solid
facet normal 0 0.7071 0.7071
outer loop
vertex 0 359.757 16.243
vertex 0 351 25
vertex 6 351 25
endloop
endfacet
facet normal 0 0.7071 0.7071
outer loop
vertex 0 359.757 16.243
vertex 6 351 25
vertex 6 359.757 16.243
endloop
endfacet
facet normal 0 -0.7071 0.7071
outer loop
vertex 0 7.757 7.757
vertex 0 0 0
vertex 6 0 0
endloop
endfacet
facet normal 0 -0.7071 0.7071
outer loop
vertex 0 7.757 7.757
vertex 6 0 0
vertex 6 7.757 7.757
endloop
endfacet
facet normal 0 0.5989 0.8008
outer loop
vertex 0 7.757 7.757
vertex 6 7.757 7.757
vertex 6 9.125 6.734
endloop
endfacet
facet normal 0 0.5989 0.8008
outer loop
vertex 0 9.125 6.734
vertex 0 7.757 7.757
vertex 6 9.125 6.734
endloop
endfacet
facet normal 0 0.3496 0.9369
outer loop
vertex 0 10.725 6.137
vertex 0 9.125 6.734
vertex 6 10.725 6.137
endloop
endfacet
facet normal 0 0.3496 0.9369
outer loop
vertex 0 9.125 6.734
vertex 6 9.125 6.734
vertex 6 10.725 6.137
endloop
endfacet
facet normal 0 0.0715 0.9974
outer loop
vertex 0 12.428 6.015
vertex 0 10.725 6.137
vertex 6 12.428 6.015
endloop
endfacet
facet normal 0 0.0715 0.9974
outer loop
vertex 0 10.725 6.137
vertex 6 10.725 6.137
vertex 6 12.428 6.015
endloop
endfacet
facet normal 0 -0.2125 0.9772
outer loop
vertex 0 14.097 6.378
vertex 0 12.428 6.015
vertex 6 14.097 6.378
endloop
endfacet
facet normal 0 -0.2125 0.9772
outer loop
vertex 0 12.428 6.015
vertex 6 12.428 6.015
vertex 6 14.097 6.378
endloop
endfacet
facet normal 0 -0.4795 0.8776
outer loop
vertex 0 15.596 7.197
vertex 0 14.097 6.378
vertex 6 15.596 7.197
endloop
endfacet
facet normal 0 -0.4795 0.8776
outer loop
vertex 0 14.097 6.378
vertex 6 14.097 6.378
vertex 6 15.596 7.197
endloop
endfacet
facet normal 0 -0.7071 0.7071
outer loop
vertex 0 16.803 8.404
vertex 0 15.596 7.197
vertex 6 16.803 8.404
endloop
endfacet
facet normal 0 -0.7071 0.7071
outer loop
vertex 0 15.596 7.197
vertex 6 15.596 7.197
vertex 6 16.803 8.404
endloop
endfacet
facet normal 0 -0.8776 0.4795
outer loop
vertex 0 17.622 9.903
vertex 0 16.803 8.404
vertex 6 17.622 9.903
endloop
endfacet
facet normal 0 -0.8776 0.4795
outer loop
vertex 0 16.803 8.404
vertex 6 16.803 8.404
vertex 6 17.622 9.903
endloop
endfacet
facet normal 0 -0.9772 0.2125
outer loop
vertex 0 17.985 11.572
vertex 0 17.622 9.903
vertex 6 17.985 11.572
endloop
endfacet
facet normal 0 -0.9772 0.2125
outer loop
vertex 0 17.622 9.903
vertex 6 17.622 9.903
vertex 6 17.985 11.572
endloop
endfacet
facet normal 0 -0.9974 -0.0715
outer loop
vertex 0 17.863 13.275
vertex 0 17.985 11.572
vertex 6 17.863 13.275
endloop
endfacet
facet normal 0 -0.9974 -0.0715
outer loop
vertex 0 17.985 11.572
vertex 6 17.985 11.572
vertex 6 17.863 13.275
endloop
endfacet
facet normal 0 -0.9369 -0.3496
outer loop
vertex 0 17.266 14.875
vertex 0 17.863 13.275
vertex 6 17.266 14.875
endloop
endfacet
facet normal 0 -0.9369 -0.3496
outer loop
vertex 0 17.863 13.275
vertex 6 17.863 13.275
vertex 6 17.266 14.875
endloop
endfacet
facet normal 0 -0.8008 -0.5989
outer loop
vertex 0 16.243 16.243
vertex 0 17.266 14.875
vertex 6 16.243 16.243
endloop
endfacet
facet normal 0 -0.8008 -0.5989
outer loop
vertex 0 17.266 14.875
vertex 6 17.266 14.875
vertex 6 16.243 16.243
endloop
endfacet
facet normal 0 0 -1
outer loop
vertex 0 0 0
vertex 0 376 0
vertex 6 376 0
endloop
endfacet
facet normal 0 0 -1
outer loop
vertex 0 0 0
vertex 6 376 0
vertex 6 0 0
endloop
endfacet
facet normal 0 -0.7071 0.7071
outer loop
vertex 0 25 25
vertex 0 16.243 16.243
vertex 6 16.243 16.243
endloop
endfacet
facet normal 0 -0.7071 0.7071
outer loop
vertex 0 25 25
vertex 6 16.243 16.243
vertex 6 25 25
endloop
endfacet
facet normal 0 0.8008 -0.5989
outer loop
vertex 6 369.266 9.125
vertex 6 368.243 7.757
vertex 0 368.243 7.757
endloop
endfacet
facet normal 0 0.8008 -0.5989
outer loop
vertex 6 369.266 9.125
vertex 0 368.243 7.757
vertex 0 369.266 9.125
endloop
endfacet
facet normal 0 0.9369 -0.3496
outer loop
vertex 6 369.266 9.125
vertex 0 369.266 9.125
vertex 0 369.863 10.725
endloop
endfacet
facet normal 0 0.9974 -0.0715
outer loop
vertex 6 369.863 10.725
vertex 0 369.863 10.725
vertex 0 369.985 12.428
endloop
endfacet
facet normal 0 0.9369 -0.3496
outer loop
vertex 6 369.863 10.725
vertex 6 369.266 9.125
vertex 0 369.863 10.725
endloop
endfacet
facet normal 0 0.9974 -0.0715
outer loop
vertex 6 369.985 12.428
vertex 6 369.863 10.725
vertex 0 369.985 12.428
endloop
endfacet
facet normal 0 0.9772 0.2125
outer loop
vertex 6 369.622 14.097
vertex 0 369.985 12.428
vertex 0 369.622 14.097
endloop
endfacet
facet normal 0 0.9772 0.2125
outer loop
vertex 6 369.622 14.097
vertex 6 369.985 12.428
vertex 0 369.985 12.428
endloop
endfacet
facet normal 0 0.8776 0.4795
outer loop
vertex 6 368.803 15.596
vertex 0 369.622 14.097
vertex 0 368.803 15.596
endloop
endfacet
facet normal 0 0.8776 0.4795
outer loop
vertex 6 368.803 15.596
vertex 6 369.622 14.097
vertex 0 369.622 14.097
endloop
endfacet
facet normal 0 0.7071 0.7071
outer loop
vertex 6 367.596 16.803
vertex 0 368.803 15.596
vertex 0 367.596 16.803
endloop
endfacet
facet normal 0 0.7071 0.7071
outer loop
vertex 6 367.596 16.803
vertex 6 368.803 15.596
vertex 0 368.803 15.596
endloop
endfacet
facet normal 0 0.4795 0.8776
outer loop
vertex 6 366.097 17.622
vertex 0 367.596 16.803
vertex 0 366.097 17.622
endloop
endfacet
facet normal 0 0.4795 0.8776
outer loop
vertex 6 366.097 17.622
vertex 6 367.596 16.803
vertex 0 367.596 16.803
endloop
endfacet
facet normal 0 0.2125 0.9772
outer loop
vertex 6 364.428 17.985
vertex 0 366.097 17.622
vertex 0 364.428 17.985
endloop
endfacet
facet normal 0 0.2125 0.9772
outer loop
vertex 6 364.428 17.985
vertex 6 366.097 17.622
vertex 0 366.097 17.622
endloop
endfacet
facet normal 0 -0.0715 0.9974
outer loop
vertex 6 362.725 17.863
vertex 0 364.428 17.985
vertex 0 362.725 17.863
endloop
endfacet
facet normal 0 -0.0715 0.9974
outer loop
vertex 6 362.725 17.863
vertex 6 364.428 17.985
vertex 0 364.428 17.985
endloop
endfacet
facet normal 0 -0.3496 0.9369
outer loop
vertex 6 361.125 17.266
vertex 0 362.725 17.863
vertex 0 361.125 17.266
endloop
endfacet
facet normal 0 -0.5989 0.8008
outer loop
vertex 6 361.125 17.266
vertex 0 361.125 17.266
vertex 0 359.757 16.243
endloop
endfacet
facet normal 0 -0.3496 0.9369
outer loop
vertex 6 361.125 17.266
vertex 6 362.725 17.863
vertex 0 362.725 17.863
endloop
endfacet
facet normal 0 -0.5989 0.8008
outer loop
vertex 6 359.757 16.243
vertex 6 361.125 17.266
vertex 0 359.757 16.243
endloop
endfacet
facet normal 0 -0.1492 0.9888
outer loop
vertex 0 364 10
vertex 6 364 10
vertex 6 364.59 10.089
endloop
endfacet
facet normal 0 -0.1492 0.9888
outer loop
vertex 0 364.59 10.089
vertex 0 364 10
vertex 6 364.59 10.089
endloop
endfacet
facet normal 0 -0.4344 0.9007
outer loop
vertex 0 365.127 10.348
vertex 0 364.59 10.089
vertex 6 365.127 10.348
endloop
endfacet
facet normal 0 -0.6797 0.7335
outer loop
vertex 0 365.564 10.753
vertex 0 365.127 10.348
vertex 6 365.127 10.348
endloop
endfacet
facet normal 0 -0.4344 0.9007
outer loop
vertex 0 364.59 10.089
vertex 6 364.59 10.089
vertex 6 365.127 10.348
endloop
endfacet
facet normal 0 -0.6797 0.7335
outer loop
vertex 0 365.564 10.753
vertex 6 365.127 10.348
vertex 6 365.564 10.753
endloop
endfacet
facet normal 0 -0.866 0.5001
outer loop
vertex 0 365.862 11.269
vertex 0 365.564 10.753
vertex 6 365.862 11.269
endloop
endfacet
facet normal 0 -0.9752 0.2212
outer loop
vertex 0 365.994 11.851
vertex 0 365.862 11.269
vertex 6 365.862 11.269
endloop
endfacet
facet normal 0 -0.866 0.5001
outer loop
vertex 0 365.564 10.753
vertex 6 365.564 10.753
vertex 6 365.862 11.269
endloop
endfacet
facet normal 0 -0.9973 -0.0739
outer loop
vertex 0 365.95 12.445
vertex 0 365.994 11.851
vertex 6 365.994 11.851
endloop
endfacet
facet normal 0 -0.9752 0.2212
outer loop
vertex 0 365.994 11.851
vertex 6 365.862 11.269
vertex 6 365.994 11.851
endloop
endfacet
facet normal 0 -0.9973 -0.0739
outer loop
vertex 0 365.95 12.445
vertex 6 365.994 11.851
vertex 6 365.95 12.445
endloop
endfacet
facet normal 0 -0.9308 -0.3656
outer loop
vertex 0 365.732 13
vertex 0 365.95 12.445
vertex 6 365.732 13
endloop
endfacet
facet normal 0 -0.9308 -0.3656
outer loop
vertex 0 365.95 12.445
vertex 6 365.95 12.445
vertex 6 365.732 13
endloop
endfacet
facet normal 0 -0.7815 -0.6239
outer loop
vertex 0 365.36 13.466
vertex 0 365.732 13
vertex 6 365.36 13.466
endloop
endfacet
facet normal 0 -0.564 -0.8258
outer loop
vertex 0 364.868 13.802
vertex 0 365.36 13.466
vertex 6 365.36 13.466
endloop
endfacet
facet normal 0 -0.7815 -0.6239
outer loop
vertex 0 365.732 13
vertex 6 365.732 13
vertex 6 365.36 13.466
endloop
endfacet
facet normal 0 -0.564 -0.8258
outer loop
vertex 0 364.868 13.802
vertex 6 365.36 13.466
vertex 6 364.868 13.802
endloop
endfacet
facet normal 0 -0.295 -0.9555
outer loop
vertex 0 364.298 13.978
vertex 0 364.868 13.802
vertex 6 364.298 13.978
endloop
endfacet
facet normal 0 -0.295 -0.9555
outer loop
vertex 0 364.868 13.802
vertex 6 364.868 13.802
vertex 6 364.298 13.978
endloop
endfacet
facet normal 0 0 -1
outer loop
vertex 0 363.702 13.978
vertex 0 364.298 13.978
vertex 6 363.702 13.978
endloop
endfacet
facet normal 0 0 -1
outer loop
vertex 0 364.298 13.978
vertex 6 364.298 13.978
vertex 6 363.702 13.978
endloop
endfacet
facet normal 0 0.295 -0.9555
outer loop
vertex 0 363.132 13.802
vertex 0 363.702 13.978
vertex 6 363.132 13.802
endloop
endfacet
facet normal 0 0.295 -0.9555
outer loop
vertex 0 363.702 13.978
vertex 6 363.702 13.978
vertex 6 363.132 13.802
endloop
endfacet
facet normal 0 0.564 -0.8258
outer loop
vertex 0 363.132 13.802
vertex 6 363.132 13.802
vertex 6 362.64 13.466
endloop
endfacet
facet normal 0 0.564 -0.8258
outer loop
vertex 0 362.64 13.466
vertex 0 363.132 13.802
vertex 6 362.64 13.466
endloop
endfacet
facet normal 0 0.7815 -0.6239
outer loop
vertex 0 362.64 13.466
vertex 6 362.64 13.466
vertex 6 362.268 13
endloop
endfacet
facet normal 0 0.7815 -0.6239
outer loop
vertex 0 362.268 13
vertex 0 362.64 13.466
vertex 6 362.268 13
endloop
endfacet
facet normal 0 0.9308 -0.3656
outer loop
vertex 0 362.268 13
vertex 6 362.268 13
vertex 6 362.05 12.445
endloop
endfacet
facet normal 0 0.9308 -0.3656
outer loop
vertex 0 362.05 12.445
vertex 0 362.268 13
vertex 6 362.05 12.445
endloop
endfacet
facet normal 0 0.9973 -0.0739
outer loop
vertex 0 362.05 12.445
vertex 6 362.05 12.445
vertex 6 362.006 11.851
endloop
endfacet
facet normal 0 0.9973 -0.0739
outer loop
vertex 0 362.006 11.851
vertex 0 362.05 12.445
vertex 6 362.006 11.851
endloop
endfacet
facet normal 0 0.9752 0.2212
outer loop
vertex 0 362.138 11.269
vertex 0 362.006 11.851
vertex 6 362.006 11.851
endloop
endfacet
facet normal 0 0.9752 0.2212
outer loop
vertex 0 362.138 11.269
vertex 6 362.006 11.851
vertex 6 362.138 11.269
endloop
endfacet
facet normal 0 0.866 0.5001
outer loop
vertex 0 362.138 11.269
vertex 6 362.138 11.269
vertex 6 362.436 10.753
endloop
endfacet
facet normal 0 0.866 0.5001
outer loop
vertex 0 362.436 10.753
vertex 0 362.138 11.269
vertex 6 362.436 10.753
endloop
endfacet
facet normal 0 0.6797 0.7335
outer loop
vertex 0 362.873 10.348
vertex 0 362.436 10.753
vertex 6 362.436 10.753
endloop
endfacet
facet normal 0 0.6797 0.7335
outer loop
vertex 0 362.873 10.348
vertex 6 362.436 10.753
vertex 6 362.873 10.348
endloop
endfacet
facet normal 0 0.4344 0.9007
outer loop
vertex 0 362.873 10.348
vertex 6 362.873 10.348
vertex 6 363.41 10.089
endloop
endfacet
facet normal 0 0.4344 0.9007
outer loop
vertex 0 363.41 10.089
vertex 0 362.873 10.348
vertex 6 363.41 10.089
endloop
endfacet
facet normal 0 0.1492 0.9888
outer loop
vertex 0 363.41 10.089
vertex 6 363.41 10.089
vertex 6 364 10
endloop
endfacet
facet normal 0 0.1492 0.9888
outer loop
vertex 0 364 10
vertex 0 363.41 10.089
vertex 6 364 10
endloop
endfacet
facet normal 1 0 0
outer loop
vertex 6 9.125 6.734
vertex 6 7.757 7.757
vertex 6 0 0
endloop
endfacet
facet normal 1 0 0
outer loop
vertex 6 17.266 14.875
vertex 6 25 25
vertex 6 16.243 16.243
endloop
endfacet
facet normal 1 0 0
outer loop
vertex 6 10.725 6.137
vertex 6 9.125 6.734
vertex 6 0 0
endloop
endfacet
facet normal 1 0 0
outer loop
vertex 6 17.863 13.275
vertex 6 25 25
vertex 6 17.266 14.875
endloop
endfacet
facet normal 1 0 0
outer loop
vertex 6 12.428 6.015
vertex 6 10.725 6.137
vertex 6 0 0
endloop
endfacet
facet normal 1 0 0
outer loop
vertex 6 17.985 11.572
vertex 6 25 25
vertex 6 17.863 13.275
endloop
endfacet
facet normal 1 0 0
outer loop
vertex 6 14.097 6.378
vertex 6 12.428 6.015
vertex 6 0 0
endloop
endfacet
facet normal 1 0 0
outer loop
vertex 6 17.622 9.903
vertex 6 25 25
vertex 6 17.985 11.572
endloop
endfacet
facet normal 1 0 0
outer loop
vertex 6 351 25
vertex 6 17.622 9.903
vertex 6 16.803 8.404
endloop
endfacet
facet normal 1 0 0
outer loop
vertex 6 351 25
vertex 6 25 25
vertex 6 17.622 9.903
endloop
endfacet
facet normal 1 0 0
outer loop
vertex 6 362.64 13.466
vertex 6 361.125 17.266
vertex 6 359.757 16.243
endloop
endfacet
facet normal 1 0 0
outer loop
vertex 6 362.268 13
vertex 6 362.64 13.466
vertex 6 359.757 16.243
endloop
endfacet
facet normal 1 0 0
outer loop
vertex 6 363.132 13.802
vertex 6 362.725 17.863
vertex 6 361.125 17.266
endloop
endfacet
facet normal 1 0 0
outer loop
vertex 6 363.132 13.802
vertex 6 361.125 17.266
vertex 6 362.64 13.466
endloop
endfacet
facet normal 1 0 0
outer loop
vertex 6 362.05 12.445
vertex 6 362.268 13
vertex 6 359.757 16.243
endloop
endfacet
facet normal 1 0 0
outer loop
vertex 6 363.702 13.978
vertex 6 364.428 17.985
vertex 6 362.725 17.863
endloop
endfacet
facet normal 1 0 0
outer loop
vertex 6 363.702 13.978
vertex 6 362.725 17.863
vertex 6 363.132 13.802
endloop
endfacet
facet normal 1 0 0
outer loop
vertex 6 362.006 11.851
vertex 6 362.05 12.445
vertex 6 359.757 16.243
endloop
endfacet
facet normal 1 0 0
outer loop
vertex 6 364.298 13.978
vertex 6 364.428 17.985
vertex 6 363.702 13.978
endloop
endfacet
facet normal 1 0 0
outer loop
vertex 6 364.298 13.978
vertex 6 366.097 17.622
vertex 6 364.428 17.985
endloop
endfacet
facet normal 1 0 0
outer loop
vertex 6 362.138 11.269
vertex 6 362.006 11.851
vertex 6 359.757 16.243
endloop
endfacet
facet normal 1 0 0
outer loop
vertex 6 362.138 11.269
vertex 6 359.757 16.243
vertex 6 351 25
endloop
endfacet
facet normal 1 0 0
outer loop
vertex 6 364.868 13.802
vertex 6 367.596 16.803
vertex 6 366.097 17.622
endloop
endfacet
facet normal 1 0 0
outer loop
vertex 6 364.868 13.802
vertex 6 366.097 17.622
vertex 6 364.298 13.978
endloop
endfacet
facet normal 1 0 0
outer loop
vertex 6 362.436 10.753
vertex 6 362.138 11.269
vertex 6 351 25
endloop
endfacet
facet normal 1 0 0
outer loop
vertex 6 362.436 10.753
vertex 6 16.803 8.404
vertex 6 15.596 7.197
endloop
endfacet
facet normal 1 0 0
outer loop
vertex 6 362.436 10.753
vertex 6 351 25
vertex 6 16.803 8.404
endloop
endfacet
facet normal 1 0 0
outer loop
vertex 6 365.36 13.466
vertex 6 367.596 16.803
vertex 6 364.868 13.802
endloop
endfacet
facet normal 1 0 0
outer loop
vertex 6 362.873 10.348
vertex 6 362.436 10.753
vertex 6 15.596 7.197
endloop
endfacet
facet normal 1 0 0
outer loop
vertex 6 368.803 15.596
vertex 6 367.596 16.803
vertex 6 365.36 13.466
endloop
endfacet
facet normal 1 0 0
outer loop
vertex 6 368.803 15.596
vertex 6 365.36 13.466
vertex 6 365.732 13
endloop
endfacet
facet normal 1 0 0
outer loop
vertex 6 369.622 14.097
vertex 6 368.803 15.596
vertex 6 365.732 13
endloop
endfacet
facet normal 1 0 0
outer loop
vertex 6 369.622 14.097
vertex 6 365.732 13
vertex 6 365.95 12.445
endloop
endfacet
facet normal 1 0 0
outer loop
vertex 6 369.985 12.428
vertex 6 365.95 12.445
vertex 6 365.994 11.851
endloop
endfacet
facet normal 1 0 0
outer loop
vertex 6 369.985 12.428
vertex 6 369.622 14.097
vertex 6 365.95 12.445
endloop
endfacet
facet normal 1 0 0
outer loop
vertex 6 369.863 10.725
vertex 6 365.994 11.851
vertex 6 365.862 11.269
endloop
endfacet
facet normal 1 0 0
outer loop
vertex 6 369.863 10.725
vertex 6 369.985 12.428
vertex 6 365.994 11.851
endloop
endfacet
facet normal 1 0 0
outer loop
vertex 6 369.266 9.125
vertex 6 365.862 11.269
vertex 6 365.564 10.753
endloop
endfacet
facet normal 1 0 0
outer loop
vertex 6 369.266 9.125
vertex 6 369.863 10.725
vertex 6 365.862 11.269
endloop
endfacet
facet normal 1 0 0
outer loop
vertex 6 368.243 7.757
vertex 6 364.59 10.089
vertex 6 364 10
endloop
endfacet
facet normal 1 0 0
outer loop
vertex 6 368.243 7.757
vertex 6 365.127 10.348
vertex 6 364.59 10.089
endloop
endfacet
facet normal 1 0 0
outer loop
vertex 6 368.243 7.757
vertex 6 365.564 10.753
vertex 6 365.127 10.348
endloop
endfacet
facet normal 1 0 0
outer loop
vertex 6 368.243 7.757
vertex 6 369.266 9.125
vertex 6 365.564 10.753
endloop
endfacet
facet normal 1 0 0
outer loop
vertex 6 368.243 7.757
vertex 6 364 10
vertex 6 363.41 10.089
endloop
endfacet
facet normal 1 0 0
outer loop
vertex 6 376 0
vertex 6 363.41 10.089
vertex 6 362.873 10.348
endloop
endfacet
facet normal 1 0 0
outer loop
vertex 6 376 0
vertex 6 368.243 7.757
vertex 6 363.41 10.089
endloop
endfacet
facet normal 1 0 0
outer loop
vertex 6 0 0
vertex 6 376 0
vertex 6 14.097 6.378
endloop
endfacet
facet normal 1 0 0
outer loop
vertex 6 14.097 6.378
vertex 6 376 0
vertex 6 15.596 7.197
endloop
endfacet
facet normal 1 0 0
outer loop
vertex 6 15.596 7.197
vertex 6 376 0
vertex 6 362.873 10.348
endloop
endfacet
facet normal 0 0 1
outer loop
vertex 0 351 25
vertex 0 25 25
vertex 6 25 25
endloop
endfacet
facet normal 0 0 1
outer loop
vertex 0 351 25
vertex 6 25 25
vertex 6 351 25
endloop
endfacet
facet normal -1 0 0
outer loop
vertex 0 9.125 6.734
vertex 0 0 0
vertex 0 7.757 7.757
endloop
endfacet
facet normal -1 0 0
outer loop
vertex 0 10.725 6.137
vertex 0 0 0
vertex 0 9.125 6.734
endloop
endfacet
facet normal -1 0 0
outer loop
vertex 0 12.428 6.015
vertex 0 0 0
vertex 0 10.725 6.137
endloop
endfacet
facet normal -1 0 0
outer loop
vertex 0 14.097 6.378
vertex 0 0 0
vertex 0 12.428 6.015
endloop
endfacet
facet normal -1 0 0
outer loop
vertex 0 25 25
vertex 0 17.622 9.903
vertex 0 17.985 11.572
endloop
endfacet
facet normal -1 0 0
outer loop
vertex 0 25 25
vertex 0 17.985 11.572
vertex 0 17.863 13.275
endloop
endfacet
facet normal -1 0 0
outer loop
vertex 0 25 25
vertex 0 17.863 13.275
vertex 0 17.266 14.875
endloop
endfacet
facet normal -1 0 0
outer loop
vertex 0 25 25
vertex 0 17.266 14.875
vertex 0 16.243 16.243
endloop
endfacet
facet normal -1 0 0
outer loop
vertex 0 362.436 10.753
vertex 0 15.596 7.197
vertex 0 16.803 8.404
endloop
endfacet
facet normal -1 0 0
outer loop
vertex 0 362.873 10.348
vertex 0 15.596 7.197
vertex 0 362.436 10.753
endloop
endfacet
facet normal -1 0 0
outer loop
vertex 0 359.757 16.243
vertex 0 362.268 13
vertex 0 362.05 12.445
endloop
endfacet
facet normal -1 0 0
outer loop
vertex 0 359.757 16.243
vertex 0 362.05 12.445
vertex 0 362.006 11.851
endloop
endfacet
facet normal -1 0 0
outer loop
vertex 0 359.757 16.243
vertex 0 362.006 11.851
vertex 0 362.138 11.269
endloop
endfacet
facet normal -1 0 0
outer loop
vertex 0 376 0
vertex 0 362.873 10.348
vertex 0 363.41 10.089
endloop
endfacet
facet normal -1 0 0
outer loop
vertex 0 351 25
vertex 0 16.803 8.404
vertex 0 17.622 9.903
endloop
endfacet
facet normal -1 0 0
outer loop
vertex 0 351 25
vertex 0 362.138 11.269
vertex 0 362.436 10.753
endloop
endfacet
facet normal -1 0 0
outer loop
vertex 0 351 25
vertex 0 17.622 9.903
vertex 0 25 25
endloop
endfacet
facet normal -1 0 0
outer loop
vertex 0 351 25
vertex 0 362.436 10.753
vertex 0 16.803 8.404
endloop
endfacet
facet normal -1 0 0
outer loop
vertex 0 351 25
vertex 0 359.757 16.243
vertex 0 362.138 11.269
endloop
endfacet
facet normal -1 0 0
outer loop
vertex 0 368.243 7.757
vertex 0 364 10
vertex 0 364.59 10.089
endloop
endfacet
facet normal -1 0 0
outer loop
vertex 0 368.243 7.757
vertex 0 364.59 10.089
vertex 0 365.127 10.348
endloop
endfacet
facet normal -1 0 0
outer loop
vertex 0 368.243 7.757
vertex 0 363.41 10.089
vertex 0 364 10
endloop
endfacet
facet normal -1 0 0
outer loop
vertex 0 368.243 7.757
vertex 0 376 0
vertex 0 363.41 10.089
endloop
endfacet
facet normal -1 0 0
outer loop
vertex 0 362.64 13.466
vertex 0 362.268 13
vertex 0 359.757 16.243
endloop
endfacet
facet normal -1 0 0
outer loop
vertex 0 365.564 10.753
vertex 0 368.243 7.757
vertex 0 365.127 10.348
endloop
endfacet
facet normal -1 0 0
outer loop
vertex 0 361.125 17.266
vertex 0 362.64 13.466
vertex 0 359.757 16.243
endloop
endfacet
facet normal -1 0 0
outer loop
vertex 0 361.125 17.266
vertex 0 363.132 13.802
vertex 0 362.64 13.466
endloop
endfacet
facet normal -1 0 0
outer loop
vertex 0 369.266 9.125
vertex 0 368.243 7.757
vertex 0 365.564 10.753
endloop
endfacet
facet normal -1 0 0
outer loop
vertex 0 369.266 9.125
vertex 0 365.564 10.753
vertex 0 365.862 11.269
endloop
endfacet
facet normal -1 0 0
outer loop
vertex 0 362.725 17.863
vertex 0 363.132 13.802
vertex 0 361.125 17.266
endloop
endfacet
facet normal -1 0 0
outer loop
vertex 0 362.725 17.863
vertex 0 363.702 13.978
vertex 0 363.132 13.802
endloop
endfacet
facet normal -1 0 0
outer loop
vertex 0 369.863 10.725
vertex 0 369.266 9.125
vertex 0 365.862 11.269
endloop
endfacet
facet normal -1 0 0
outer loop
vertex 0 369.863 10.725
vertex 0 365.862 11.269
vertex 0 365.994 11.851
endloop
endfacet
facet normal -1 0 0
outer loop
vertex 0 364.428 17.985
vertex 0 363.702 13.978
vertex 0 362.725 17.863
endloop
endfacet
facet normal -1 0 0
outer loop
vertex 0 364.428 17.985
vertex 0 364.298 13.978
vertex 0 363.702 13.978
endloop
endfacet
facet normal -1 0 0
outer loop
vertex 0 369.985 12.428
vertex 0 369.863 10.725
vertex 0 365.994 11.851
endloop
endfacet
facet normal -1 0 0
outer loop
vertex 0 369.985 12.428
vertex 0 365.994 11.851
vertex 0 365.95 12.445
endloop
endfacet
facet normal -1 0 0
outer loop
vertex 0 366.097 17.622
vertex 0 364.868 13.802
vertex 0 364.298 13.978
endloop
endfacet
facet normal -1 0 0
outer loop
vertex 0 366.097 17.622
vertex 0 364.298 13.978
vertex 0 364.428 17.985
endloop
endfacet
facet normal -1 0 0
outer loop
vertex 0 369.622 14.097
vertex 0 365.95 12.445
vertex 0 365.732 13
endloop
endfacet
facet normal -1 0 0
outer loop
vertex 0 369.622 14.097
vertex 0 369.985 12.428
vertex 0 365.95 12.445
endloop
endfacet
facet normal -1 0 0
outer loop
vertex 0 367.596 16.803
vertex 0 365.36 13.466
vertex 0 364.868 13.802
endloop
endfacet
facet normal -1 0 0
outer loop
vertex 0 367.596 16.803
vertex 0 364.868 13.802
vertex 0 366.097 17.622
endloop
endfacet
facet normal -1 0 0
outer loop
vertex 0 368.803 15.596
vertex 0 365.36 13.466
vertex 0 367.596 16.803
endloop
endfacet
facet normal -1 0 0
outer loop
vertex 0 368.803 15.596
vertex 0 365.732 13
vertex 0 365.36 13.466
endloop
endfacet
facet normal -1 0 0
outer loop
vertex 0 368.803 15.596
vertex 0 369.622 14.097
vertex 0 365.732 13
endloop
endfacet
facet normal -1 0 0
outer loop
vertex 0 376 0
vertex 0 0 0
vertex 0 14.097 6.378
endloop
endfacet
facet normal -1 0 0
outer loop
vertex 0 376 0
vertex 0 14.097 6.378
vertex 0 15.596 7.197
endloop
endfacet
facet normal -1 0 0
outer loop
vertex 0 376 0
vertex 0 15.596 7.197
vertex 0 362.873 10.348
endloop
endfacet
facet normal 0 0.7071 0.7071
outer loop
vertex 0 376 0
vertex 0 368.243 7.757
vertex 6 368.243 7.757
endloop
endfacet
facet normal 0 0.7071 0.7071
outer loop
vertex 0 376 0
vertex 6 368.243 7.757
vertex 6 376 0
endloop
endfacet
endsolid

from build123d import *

# Parameters (mm, degrees)
BOSS_EXTRUDE1_DEPTH = 6
SKETCH4_R           = 6
BOSS_EXTRUDE2_DEPTH = 6
SKETCH3_R           = 2
SKETCH3_R_2         = 6
CUT_EXTRUDE1_DEPTH  = 377.877964333


with BuildPart() as part:
    # Sketch2 → Boss-Extrude1 (new body)
    with BuildSketch(Plane(origin=(0, 0, 0), x_dir=(0, 0, -1), z_dir=(1, 0, 0))):
        Polygon((0, 376), (0, 0), (-25, 25), (-25, 351), align=None)
    extrude(amount=BOSS_EXTRUDE1_DEPTH)

    # Sketch4 → Boss-Extrude2 (add)
    with BuildSketch(Plane(origin=(6, 0, 0), x_dir=(0, 0, -1), z_dir=(1, 0, 0))):
        with Locations((-12, 364)):
            Circle(SKETCH4_R)
    extrude(amount=-BOSS_EXTRUDE2_DEPTH)

    # Sketch3 → Cut-Extrude1 (cut, through all)
    with BuildSketch(Plane(origin=(6, 0, 0), x_dir=(0, 0, -1), z_dir=(1, 0, 0))):
        with Locations((-12, 364)):
            Circle(SKETCH3_R)
        with Locations((-12, 12)):
            Circle(SKETCH3_R_2)
    extrude(amount=-CUT_EXTRUDE1_DEPTH, mode=Mode.SUBTRACT)


solid = part.part
